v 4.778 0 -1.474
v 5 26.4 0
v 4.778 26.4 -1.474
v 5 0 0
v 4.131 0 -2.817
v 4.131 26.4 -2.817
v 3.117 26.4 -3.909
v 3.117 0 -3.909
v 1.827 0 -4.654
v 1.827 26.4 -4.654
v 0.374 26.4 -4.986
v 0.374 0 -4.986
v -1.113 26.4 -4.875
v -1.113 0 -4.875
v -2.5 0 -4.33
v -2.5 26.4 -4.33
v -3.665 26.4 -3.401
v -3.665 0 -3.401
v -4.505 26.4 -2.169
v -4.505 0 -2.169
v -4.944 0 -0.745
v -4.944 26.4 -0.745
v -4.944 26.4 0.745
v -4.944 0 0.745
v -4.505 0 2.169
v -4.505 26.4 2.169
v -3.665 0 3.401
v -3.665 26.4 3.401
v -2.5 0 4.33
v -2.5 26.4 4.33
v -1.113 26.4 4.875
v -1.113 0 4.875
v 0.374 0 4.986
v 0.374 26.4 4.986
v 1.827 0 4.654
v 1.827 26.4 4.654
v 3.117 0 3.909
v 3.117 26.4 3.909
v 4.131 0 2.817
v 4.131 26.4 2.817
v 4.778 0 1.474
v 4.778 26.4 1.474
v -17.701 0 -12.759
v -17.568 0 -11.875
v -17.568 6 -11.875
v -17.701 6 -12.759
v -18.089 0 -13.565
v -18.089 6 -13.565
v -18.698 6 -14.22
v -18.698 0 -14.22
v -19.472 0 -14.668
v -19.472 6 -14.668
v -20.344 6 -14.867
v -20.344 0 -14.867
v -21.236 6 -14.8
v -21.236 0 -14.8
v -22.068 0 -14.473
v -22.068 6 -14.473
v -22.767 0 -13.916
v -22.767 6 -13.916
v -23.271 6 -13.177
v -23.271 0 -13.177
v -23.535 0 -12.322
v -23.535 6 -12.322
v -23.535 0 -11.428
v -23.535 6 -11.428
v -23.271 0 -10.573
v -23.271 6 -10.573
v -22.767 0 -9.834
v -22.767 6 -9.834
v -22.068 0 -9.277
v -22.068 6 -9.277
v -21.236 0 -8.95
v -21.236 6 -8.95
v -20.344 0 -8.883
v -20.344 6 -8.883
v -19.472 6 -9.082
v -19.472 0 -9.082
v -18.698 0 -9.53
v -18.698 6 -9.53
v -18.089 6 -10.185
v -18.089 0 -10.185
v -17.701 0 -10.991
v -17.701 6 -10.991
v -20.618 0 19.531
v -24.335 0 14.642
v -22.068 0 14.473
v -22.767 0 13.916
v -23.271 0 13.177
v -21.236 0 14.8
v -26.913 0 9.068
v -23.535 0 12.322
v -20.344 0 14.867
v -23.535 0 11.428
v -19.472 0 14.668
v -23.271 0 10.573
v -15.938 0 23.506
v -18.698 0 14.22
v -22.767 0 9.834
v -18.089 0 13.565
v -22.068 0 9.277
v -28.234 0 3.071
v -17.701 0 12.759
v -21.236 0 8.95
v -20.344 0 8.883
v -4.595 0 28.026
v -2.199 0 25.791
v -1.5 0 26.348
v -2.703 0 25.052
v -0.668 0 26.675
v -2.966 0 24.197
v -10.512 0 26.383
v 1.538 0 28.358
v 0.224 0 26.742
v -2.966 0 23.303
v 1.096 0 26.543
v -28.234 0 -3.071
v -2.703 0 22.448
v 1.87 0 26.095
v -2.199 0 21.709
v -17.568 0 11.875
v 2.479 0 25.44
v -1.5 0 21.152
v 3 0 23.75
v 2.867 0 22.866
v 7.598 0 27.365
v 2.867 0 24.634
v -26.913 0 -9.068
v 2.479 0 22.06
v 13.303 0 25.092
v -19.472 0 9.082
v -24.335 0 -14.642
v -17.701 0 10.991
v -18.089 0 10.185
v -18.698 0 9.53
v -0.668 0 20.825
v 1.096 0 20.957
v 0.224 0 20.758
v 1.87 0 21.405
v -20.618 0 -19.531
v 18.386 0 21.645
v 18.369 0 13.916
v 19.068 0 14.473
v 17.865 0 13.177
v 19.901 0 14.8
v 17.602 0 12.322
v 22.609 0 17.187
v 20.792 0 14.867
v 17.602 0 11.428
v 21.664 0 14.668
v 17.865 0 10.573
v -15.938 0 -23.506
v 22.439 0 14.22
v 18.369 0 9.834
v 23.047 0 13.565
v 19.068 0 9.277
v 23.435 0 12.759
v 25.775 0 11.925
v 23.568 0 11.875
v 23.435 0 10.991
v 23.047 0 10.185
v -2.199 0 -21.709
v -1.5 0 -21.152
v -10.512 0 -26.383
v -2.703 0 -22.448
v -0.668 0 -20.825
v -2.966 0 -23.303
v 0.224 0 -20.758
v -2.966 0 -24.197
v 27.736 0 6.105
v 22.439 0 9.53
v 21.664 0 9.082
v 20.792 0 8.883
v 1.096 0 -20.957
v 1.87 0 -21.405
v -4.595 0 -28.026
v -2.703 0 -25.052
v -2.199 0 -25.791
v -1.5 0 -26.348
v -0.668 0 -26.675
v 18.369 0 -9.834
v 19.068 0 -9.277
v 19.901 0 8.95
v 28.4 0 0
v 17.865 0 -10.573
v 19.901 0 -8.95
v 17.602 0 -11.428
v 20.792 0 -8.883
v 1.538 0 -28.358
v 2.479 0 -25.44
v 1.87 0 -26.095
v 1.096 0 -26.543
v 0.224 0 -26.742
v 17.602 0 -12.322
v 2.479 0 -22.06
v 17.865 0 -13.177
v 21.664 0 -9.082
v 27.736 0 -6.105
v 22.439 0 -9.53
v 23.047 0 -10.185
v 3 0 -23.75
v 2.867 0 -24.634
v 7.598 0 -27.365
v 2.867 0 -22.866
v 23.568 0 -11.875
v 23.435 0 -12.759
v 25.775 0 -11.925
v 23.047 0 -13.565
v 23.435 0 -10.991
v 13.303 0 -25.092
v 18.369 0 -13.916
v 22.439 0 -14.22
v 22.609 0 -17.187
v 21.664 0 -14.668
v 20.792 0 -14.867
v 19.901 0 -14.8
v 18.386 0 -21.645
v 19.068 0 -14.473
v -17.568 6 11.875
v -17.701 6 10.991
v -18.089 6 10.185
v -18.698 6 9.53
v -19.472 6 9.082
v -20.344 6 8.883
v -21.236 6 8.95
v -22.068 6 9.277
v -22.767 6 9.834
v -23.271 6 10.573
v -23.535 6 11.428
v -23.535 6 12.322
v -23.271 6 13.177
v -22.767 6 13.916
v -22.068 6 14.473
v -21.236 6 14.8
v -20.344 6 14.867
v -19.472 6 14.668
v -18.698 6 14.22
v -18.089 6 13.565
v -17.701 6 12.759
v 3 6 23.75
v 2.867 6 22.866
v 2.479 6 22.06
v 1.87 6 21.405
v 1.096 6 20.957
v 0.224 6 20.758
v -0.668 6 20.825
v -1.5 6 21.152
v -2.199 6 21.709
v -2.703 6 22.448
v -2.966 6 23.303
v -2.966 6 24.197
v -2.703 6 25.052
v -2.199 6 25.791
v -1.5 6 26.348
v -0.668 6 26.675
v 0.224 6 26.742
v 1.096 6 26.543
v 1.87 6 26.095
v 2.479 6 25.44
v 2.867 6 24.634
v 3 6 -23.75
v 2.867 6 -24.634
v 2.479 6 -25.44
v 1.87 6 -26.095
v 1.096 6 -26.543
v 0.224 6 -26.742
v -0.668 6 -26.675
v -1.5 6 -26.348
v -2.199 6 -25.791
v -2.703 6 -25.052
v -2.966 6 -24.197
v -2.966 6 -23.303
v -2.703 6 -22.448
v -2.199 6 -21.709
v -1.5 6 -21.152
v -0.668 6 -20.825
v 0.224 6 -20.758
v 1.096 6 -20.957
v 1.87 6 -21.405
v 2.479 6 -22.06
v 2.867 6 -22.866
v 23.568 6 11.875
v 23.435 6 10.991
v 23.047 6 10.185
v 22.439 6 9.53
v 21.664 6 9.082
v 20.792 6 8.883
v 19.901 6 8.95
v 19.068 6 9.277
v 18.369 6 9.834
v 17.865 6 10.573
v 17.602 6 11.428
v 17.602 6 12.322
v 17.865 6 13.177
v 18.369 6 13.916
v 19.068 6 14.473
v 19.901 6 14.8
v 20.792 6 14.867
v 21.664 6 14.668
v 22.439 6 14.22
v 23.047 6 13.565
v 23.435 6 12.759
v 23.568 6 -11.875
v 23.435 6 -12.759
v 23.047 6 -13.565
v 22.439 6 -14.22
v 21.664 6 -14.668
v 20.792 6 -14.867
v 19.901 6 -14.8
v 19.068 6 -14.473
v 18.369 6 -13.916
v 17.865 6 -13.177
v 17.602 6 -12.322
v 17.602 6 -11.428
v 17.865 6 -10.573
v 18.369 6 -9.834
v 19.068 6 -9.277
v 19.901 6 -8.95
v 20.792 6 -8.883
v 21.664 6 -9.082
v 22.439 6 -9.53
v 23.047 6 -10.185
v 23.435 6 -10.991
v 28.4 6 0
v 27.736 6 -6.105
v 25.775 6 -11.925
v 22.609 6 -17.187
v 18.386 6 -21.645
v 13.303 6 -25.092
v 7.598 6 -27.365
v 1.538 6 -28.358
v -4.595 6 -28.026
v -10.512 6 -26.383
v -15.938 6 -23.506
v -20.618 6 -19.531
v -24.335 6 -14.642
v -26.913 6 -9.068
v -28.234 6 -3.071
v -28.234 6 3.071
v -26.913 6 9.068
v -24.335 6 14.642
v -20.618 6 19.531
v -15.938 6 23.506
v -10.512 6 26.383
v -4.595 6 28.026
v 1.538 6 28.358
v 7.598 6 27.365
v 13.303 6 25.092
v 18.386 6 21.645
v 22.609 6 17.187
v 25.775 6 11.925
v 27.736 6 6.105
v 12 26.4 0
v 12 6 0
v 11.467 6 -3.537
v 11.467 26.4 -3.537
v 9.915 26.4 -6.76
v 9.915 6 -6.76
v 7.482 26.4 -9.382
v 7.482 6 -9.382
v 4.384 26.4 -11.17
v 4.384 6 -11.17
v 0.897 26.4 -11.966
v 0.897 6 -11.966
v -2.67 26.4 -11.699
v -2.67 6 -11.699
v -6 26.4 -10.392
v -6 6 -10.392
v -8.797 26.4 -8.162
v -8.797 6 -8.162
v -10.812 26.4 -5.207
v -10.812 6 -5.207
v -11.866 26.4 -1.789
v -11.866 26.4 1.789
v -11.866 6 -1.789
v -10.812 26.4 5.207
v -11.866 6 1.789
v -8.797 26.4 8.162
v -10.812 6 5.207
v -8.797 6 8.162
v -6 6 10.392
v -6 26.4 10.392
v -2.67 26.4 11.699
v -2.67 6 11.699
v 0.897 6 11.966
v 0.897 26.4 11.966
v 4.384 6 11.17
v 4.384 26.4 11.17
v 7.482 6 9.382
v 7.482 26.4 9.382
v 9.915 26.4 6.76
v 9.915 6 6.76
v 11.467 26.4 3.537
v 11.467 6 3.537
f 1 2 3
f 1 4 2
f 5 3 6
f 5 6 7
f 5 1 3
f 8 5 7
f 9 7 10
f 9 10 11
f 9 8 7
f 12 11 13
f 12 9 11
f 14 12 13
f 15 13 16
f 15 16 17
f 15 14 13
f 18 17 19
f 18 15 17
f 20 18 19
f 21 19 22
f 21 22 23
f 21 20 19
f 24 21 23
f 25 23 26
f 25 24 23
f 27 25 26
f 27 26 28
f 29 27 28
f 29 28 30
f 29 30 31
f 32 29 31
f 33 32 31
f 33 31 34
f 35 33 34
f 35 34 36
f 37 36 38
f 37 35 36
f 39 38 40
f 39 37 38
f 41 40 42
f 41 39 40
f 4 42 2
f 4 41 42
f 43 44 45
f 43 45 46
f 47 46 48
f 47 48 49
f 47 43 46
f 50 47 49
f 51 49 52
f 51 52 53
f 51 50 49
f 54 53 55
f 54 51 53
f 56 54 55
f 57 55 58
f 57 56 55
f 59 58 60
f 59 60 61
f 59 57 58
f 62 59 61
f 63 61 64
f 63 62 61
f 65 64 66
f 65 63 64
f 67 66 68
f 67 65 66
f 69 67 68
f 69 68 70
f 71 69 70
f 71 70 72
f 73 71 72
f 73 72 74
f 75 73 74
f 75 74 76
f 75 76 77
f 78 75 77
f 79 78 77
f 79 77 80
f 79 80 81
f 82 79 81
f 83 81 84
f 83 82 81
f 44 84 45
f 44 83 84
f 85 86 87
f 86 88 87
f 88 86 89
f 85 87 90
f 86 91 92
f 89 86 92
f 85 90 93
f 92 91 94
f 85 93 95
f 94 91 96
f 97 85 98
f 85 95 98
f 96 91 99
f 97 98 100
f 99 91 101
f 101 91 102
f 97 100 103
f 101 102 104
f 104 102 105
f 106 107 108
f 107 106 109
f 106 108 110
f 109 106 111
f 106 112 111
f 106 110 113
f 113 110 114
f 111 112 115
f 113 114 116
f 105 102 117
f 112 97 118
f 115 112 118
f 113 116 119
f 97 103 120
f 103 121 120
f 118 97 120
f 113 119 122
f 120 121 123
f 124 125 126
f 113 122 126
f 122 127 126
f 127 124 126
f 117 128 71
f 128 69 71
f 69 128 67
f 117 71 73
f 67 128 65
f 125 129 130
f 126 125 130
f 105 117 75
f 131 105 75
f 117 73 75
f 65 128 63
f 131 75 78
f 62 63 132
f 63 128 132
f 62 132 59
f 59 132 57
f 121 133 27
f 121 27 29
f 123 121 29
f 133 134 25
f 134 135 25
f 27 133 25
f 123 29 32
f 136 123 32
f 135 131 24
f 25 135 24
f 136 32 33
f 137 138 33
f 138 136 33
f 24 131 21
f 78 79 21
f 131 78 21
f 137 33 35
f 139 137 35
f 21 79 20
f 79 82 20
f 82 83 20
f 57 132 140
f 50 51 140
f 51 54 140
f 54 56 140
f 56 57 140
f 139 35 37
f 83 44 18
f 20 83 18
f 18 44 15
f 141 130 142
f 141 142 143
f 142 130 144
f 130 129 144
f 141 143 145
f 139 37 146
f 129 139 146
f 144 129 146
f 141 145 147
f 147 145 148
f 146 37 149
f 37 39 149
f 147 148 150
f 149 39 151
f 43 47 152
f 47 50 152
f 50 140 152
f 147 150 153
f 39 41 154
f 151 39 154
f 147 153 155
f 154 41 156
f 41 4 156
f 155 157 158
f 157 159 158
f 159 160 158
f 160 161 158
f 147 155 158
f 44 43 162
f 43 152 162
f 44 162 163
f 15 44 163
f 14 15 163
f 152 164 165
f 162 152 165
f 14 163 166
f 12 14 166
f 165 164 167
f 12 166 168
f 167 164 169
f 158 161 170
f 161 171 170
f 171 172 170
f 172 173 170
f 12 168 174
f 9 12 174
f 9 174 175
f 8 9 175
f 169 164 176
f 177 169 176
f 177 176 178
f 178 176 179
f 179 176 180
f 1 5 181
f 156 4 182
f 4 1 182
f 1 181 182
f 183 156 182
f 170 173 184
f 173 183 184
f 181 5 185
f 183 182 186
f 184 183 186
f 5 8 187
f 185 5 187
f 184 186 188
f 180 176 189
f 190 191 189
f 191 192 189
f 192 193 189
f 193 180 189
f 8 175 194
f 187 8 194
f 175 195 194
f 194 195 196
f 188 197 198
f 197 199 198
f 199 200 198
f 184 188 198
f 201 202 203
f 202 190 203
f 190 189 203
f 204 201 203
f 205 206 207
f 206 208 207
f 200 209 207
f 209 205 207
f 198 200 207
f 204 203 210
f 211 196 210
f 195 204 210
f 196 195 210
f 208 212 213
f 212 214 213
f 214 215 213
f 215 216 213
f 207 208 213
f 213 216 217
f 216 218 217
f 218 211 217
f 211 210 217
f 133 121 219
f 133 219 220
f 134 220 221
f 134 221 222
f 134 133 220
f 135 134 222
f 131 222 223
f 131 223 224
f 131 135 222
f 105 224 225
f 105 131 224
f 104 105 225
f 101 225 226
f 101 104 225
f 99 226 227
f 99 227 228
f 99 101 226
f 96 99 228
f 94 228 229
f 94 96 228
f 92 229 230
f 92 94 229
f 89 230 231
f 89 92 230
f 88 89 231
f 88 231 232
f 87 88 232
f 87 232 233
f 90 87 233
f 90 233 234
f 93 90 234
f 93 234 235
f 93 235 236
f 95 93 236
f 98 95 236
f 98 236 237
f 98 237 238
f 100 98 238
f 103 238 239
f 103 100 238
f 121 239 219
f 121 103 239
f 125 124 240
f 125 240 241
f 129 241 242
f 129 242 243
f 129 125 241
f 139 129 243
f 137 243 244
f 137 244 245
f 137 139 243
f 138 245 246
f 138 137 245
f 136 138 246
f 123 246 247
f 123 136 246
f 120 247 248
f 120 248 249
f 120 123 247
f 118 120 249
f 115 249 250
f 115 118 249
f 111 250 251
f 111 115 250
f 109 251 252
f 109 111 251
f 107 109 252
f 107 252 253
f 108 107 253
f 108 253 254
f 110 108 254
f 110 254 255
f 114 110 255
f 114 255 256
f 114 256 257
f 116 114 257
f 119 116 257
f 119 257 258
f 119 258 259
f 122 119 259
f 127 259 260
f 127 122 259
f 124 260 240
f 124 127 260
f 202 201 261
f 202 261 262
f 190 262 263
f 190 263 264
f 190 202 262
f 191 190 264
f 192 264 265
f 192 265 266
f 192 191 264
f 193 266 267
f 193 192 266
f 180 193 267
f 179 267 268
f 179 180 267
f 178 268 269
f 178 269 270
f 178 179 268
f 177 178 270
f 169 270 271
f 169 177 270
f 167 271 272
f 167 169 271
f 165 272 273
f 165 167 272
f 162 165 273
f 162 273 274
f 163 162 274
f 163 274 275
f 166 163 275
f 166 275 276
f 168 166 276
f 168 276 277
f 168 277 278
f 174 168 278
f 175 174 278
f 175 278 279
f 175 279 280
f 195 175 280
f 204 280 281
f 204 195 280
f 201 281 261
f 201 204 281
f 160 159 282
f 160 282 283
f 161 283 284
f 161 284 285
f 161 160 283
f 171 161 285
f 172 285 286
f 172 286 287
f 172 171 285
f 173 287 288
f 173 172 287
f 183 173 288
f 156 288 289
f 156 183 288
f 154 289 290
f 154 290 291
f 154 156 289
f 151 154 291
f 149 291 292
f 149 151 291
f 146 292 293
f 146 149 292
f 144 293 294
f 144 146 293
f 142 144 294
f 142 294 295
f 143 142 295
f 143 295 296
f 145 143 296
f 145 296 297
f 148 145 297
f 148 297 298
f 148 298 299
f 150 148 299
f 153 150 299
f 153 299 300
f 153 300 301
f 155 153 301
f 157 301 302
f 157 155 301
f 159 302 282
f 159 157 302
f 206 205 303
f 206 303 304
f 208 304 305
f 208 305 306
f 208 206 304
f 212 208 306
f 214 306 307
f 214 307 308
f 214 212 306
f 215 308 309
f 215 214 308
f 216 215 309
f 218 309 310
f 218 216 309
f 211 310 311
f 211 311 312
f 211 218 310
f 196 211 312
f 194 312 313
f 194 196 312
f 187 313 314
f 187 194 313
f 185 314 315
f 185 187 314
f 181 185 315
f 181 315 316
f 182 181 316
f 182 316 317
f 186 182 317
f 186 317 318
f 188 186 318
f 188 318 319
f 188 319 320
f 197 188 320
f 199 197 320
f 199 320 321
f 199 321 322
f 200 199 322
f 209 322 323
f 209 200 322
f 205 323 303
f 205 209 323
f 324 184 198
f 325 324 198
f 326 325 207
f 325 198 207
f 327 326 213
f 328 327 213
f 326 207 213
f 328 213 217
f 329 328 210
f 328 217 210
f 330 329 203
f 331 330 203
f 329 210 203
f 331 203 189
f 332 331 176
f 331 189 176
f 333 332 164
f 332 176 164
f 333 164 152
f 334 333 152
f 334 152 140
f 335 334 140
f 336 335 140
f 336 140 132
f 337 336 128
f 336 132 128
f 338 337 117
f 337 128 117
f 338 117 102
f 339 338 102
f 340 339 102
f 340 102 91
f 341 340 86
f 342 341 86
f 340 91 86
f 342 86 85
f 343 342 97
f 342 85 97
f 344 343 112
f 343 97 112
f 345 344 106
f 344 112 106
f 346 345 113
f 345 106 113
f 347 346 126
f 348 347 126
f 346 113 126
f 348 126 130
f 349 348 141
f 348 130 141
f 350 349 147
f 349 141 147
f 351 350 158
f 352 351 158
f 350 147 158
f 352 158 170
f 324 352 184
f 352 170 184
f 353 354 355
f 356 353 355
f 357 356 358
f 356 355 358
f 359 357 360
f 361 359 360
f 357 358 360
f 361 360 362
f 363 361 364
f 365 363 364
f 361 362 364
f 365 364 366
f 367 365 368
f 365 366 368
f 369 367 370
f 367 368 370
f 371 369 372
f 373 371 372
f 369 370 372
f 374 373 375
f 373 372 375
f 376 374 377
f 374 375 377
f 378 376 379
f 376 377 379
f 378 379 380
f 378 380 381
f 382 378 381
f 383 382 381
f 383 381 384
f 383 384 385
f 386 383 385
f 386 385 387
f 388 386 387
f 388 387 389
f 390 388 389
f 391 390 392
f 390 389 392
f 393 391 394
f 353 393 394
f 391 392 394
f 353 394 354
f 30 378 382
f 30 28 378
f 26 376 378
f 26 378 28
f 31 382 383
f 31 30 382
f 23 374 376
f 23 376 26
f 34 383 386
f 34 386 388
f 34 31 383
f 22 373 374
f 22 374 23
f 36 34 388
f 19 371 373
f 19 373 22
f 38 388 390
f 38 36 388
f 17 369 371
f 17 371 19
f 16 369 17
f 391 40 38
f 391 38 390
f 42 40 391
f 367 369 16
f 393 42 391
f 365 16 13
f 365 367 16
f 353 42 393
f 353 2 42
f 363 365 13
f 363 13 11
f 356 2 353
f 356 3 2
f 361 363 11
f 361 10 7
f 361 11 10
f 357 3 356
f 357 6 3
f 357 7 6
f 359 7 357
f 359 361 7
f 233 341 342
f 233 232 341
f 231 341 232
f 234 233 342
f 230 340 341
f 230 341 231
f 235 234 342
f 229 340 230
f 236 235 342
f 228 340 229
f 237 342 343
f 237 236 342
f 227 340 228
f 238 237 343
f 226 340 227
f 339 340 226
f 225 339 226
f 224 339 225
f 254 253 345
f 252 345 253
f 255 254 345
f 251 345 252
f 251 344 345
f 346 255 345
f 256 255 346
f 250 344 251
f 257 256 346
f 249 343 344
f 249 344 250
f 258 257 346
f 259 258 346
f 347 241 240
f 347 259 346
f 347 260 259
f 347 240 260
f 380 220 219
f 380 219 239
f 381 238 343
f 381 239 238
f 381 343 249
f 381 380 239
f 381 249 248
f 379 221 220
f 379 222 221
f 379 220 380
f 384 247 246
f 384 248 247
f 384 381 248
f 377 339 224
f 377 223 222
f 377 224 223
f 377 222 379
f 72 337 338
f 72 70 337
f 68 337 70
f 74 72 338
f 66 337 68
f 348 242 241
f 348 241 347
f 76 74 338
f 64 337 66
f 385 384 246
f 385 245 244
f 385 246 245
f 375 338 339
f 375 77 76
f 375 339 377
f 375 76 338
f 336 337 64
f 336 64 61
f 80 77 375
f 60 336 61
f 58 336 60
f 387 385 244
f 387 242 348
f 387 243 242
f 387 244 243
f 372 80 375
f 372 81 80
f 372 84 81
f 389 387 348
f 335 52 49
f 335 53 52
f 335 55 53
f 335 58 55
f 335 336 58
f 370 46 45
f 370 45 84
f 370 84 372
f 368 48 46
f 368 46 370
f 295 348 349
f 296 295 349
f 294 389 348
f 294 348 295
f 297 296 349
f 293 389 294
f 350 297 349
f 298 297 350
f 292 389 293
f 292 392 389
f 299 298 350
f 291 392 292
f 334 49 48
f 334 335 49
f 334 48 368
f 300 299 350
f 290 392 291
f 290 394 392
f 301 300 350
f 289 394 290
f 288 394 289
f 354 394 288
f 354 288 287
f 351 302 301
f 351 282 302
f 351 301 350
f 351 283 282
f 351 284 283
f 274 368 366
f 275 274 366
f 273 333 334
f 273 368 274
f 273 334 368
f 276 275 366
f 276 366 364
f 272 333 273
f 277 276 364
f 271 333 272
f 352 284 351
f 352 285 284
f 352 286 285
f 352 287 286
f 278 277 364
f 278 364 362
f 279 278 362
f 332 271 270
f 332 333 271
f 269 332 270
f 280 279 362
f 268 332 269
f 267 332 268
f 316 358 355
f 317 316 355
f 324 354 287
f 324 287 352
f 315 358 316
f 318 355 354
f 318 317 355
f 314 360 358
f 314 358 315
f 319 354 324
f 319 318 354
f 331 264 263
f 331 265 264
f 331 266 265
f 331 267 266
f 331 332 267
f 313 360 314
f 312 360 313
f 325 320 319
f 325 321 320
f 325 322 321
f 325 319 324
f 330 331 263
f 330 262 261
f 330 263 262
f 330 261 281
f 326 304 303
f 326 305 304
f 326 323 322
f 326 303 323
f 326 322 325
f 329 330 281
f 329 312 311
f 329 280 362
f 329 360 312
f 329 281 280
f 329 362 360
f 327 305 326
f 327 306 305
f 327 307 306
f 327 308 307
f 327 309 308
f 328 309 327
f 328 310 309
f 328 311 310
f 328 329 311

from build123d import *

# Parameters (mm, degrees)
SKETCH1_R           = 28.4
SKETCH1_R_2         = 5
SKETCH1_R_3         = 3
BOSS_EXTRUDE3_DEPTH = 6
SKETCH5_R           = 12
SKETCH5_R_2         = 5
BOSS_EXTRUDE4_DEPTH = 20.4


with BuildPart() as part:
    # Sketch1 → Boss-Extrude3 (new body)
    with BuildSketch(Plane(origin=(0, 0, 0), x_dir=(1, 0, 0), z_dir=(0, 1, 0))):
        Circle(SKETCH1_R)
        Circle(SKETCH1_R_2, mode=Mode.SUBTRACT)
        with Locations((0, 23.75)):
            Circle(SKETCH1_R_3, mode=Mode.SUBTRACT)
        with Locations((20.56810334, 11.875)):
            Circle(SKETCH1_R_3, mode=Mode.SUBTRACT)
        with Locations((20.56810334, -11.875)):
            Circle(SKETCH1_R_3, mode=Mode.SUBTRACT)
        with Locations((0, -23.75)):
            Circle(SKETCH1_R_3, mode=Mode.SUBTRACT)
        with Locations((-20.56810334, -11.875)):
            Circle(SKETCH1_R_3, mode=Mode.SUBTRACT)
        with Locations((-20.56810334, 11.875)):
            Circle(SKETCH1_R_3, mode=Mode.SUBTRACT)
    extrude(amount=BOSS_EXTRUDE3_DEPTH)

    # Sketch5 → Boss-Extrude4 (add)
    with BuildSketch(Plane(origin=(0, 6, 0), x_dir=(1, 0, 0), z_dir=(0, 1, 0))):
        Circle(SKETCH5_R)
        Circle(SKETCH5_R_2, mode=Mode.SUBTRACT)
    extrude(amount=BOSS_EXTRUDE4_DEPTH)


solid = part.part
